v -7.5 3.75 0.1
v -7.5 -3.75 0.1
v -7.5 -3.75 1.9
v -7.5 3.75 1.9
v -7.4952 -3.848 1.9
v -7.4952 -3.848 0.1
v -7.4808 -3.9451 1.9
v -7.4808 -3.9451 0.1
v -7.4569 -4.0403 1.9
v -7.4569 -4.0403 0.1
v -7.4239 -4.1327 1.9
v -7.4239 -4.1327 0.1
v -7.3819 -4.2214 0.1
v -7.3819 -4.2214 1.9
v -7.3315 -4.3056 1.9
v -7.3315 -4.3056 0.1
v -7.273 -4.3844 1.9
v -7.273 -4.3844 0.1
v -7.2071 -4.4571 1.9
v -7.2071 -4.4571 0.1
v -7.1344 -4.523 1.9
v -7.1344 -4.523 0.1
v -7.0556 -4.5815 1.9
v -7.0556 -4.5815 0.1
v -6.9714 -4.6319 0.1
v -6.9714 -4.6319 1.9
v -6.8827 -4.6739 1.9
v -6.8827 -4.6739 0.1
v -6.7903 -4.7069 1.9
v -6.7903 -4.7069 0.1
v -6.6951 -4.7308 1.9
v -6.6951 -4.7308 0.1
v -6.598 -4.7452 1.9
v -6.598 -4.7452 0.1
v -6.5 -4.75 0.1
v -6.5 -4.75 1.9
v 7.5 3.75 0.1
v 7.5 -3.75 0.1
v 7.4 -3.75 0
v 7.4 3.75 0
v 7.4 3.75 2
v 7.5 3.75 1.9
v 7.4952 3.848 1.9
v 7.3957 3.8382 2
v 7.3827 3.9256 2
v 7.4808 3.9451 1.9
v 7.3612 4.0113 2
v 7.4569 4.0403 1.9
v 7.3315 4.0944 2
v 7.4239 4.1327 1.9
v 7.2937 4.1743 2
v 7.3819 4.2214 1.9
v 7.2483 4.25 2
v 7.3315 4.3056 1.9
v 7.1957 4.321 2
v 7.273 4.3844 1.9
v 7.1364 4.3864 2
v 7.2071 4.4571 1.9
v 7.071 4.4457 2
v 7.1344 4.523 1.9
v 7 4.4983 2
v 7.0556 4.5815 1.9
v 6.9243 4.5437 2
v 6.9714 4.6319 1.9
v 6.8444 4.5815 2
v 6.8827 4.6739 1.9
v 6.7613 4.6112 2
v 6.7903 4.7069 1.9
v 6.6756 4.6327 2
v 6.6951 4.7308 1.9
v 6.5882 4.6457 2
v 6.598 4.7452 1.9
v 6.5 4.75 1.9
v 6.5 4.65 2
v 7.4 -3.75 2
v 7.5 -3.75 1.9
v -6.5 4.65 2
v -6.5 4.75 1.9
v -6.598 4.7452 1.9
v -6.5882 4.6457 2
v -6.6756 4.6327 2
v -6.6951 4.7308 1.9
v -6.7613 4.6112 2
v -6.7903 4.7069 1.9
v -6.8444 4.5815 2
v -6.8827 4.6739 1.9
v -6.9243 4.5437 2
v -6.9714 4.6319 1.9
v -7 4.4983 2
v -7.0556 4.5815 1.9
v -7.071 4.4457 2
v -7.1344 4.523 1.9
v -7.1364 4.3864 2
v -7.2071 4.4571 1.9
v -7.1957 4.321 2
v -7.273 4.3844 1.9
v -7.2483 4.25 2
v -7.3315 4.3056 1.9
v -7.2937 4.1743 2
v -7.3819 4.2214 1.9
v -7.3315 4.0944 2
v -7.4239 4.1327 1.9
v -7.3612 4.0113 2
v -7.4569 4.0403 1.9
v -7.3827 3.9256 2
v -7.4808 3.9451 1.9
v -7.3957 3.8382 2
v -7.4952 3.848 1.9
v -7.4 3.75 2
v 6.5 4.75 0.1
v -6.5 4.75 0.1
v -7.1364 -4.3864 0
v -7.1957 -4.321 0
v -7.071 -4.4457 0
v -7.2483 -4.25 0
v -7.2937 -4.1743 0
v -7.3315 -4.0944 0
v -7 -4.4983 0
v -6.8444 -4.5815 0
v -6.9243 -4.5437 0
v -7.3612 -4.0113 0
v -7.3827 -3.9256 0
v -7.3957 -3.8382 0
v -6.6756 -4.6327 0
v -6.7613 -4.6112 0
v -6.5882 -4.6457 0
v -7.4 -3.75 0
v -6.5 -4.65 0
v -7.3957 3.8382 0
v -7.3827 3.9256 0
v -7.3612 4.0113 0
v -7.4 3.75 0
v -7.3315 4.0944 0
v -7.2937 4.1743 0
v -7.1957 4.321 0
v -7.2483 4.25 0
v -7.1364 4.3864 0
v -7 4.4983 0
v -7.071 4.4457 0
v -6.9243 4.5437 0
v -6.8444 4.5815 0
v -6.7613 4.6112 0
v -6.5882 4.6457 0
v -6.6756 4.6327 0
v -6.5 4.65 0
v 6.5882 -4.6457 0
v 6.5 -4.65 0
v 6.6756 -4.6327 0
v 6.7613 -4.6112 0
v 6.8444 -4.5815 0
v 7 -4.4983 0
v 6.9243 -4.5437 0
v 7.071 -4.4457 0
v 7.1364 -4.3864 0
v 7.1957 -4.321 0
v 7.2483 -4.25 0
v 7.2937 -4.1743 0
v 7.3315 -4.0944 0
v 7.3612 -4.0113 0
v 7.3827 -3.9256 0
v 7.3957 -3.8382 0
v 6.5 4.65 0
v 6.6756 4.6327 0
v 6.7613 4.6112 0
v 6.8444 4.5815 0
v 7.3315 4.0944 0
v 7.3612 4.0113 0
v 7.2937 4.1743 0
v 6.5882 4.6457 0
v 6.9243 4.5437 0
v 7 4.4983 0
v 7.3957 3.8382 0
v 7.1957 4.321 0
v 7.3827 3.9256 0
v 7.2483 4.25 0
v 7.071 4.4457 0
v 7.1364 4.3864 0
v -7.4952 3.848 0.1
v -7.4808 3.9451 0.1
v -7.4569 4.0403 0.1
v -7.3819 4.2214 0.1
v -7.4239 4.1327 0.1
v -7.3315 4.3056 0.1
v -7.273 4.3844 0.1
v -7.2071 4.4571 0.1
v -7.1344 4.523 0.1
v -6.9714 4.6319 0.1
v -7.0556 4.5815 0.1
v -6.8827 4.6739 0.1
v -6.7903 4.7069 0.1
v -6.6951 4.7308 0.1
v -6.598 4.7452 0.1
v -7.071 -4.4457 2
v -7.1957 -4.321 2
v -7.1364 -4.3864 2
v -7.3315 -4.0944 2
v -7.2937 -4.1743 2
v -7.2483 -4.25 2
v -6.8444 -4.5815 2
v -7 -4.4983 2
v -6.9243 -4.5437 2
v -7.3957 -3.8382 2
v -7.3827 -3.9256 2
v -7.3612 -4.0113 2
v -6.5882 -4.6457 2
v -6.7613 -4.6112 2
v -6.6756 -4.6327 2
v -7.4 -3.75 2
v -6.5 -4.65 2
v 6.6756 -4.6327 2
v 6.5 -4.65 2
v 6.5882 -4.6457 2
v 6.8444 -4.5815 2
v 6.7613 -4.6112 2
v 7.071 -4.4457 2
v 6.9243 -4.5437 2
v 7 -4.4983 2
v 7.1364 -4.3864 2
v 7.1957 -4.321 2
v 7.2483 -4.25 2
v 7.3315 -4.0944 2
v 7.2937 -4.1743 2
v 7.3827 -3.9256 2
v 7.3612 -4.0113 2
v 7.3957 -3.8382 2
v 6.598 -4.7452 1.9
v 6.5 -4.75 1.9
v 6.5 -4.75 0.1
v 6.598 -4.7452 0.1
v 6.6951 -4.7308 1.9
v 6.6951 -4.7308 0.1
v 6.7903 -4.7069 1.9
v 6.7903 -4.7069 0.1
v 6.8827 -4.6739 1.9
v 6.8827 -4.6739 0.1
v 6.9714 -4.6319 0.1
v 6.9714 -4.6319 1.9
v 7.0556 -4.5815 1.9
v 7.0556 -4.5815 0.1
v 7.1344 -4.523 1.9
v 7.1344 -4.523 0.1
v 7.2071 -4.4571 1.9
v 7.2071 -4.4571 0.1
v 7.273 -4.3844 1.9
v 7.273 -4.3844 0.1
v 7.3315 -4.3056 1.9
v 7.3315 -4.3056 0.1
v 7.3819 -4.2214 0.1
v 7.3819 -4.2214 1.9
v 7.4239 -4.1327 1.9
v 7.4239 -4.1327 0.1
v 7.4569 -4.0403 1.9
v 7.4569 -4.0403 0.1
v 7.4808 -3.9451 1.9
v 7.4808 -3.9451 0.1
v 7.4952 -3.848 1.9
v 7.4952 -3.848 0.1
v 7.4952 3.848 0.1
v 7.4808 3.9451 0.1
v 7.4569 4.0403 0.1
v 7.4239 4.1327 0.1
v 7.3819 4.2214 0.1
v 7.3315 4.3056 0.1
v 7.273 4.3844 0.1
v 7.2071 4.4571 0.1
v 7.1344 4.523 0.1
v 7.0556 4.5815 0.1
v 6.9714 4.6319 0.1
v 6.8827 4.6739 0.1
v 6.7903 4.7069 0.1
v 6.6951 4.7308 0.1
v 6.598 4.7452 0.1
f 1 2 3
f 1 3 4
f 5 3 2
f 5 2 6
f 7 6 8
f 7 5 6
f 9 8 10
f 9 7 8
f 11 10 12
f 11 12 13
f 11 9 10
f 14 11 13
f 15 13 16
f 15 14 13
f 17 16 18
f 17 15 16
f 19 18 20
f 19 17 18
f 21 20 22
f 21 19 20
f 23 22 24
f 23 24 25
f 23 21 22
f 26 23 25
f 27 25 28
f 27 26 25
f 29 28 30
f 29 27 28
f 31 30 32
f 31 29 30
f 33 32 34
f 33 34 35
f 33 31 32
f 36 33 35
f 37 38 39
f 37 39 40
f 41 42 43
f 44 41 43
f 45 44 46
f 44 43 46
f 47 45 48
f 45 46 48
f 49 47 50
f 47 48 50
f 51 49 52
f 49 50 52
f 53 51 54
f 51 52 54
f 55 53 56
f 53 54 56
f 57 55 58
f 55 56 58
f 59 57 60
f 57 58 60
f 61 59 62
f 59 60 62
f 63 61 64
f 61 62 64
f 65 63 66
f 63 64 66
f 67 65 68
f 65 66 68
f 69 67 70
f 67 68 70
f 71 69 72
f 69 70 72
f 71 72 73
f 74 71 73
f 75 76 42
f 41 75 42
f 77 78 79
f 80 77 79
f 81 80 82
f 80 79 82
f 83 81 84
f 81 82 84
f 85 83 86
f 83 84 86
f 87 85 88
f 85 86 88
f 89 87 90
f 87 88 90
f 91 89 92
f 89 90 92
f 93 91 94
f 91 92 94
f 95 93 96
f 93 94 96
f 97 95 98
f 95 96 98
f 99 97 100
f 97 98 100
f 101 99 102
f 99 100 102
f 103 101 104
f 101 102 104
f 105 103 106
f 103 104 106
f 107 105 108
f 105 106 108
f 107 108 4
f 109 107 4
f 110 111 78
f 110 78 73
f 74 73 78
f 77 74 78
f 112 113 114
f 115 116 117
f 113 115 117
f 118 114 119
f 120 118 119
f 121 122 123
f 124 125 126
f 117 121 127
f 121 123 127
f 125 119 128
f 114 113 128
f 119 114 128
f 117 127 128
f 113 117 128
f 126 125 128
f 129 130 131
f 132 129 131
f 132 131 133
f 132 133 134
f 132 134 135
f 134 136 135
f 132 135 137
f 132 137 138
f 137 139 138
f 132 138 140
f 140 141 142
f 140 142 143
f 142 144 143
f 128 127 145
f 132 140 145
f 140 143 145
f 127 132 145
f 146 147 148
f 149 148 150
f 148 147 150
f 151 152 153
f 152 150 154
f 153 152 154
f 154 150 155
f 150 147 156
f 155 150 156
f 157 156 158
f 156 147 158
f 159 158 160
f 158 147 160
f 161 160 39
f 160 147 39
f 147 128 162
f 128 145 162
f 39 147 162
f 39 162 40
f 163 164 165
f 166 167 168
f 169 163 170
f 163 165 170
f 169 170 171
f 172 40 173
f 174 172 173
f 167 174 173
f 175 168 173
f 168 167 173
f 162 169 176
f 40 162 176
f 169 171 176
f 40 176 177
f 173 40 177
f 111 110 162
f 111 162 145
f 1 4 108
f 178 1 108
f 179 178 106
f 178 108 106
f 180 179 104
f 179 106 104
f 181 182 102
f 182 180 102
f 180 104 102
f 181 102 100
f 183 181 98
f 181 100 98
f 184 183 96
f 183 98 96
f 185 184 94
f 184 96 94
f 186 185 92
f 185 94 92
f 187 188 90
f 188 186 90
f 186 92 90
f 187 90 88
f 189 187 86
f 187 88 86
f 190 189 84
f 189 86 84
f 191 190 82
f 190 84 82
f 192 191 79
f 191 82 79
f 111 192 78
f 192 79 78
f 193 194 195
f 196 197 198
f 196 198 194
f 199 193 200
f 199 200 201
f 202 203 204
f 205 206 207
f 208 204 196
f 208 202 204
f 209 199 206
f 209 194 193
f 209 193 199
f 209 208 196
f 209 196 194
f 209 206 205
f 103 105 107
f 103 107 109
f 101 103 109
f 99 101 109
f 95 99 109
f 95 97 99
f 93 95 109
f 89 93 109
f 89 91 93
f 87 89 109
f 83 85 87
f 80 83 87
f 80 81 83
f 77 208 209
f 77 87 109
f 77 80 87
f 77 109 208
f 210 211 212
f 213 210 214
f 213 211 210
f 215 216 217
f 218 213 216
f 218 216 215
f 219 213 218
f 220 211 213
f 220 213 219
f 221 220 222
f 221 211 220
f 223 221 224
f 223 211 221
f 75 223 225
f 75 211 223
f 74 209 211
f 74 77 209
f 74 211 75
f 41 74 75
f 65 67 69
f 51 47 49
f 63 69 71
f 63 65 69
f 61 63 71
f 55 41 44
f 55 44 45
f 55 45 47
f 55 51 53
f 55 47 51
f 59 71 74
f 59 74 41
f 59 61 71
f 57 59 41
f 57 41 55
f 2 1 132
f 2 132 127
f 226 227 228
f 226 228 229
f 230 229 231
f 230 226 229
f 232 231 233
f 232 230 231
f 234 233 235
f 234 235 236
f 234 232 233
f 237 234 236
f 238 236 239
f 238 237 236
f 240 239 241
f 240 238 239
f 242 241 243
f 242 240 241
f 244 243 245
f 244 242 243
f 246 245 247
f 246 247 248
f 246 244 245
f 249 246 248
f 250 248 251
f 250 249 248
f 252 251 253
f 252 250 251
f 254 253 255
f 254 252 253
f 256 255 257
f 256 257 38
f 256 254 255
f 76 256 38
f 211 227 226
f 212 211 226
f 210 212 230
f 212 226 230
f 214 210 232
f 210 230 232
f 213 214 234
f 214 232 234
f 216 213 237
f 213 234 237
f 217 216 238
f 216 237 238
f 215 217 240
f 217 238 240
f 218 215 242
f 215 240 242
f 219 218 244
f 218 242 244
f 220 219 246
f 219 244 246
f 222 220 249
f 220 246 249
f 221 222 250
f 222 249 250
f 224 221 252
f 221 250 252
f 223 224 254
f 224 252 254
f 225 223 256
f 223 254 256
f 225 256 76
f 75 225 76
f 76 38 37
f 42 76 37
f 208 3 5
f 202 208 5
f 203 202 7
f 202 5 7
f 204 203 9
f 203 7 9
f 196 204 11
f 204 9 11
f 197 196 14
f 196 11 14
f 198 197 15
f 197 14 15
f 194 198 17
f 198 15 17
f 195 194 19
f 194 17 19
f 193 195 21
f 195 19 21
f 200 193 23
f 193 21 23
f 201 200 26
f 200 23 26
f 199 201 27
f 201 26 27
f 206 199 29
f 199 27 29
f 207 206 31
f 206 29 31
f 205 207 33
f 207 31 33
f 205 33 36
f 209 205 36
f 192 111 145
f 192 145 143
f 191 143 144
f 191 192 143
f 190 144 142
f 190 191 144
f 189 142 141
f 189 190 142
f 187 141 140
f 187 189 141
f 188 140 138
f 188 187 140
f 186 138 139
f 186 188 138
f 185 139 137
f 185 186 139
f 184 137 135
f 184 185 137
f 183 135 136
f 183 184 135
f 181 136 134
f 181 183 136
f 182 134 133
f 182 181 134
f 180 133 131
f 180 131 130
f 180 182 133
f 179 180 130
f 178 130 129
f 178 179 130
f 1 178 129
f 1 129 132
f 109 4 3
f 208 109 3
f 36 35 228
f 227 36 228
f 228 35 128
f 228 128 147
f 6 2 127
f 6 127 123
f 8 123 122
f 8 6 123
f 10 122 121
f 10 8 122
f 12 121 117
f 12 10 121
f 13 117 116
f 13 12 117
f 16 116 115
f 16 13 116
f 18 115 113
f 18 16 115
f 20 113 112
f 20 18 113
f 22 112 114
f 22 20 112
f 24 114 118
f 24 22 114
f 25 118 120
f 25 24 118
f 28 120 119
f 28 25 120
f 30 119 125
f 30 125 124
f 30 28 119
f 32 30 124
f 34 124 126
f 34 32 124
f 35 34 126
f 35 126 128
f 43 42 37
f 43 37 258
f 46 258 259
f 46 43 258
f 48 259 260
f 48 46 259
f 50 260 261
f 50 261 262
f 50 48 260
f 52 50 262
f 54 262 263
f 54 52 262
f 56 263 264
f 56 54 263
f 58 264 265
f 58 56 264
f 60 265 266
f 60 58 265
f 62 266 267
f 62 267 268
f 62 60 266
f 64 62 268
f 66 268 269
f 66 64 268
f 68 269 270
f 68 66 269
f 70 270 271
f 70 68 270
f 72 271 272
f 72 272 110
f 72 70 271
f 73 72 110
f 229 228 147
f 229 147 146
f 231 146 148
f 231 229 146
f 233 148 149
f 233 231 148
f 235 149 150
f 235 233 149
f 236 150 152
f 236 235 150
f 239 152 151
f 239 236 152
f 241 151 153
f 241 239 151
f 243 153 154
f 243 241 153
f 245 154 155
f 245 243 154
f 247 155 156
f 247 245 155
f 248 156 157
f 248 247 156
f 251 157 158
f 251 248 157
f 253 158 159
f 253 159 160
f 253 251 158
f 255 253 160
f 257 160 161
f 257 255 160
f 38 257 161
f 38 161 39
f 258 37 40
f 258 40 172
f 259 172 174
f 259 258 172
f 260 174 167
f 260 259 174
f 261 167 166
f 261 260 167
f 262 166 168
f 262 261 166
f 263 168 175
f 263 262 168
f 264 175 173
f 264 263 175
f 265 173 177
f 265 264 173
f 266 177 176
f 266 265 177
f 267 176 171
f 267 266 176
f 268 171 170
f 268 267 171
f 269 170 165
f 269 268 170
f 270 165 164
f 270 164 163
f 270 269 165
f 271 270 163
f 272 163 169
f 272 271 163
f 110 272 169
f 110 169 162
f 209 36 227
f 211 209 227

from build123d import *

# Parameters (mm, degrees)
SKETCH1_W           = 15
SKETCH1_H           = 9.5
BOSS_EXTRUDE1_DEPTH = 2
FILLET1_R           = 1
CHAMFER1_SIZE       = 0.1


with BuildPart() as part:
    # Sketch1 → Boss-Extrude1 (new body)
    with BuildSketch(Plane.XY):
        Rectangle(SKETCH1_W, SKETCH1_H)
    extrude(amount=BOSS_EXTRUDE1_DEPTH)

    # Fillet1
    fillet1_edges = [part.edges().sort_by_distance(p)[0] for p in [
        (-7.5, 4.75, 1),
        (7.5, 4.75, 1),
        (7.5, -4.75, 1),
        (-7.5, -4.75, 1),
    ]]
    fillet(fillet1_edges, radius=FILLET1_R)

    # Chamfer1
    chamfer1_edges = [part.edges().sort_by_distance(p)[0] for p in [
        (0, -4.75, 0),
        (0, -4.75, 2),
        (-7.5, 0, 0),
        (0, 4.75, 0),
        (7.5, 0, 0),
        (7.207106781, 4.457106781, 0),
        (7.207106781, -4.457106781, 0),
        (-7.207106781, 4.457106781, 0),
        (-7.207106781, -4.457106781, 0),
        (-7.5, 0, 2),
        (7.5, 0, 2),
        (0, 4.75, 2),
        (7.207106781, 4.457106781, 2),
        (7.207106781, -4.457106781, 2),
        (-7.207106781, 4.457106781, 2),
        (-7.207106781, -4.457106781, 2),
    ]]
    chamfer(chamfer1_edges, length=CHAMFER1_SIZE)


solid = part.part
